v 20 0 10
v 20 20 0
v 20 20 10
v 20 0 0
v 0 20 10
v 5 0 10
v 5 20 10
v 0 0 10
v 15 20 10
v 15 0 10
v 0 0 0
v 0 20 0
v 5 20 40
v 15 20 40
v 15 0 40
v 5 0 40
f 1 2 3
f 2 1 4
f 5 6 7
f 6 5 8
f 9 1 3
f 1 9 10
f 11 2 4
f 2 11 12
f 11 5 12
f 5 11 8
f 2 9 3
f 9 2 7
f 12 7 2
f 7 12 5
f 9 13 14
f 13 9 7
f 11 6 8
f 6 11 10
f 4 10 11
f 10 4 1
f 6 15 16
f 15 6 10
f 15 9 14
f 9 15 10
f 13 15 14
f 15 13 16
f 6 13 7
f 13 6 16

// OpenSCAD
// A finished plain-SCAD target; dimensions stay source-authored.
$fn = 32;
width = 20;
union() {
cube([width, 20, 10]);
    // The new cube's bottom centre meets [10,10,10].
    translate([5, 0, 10]) cube(size=[10,20,30], center=false);
}
